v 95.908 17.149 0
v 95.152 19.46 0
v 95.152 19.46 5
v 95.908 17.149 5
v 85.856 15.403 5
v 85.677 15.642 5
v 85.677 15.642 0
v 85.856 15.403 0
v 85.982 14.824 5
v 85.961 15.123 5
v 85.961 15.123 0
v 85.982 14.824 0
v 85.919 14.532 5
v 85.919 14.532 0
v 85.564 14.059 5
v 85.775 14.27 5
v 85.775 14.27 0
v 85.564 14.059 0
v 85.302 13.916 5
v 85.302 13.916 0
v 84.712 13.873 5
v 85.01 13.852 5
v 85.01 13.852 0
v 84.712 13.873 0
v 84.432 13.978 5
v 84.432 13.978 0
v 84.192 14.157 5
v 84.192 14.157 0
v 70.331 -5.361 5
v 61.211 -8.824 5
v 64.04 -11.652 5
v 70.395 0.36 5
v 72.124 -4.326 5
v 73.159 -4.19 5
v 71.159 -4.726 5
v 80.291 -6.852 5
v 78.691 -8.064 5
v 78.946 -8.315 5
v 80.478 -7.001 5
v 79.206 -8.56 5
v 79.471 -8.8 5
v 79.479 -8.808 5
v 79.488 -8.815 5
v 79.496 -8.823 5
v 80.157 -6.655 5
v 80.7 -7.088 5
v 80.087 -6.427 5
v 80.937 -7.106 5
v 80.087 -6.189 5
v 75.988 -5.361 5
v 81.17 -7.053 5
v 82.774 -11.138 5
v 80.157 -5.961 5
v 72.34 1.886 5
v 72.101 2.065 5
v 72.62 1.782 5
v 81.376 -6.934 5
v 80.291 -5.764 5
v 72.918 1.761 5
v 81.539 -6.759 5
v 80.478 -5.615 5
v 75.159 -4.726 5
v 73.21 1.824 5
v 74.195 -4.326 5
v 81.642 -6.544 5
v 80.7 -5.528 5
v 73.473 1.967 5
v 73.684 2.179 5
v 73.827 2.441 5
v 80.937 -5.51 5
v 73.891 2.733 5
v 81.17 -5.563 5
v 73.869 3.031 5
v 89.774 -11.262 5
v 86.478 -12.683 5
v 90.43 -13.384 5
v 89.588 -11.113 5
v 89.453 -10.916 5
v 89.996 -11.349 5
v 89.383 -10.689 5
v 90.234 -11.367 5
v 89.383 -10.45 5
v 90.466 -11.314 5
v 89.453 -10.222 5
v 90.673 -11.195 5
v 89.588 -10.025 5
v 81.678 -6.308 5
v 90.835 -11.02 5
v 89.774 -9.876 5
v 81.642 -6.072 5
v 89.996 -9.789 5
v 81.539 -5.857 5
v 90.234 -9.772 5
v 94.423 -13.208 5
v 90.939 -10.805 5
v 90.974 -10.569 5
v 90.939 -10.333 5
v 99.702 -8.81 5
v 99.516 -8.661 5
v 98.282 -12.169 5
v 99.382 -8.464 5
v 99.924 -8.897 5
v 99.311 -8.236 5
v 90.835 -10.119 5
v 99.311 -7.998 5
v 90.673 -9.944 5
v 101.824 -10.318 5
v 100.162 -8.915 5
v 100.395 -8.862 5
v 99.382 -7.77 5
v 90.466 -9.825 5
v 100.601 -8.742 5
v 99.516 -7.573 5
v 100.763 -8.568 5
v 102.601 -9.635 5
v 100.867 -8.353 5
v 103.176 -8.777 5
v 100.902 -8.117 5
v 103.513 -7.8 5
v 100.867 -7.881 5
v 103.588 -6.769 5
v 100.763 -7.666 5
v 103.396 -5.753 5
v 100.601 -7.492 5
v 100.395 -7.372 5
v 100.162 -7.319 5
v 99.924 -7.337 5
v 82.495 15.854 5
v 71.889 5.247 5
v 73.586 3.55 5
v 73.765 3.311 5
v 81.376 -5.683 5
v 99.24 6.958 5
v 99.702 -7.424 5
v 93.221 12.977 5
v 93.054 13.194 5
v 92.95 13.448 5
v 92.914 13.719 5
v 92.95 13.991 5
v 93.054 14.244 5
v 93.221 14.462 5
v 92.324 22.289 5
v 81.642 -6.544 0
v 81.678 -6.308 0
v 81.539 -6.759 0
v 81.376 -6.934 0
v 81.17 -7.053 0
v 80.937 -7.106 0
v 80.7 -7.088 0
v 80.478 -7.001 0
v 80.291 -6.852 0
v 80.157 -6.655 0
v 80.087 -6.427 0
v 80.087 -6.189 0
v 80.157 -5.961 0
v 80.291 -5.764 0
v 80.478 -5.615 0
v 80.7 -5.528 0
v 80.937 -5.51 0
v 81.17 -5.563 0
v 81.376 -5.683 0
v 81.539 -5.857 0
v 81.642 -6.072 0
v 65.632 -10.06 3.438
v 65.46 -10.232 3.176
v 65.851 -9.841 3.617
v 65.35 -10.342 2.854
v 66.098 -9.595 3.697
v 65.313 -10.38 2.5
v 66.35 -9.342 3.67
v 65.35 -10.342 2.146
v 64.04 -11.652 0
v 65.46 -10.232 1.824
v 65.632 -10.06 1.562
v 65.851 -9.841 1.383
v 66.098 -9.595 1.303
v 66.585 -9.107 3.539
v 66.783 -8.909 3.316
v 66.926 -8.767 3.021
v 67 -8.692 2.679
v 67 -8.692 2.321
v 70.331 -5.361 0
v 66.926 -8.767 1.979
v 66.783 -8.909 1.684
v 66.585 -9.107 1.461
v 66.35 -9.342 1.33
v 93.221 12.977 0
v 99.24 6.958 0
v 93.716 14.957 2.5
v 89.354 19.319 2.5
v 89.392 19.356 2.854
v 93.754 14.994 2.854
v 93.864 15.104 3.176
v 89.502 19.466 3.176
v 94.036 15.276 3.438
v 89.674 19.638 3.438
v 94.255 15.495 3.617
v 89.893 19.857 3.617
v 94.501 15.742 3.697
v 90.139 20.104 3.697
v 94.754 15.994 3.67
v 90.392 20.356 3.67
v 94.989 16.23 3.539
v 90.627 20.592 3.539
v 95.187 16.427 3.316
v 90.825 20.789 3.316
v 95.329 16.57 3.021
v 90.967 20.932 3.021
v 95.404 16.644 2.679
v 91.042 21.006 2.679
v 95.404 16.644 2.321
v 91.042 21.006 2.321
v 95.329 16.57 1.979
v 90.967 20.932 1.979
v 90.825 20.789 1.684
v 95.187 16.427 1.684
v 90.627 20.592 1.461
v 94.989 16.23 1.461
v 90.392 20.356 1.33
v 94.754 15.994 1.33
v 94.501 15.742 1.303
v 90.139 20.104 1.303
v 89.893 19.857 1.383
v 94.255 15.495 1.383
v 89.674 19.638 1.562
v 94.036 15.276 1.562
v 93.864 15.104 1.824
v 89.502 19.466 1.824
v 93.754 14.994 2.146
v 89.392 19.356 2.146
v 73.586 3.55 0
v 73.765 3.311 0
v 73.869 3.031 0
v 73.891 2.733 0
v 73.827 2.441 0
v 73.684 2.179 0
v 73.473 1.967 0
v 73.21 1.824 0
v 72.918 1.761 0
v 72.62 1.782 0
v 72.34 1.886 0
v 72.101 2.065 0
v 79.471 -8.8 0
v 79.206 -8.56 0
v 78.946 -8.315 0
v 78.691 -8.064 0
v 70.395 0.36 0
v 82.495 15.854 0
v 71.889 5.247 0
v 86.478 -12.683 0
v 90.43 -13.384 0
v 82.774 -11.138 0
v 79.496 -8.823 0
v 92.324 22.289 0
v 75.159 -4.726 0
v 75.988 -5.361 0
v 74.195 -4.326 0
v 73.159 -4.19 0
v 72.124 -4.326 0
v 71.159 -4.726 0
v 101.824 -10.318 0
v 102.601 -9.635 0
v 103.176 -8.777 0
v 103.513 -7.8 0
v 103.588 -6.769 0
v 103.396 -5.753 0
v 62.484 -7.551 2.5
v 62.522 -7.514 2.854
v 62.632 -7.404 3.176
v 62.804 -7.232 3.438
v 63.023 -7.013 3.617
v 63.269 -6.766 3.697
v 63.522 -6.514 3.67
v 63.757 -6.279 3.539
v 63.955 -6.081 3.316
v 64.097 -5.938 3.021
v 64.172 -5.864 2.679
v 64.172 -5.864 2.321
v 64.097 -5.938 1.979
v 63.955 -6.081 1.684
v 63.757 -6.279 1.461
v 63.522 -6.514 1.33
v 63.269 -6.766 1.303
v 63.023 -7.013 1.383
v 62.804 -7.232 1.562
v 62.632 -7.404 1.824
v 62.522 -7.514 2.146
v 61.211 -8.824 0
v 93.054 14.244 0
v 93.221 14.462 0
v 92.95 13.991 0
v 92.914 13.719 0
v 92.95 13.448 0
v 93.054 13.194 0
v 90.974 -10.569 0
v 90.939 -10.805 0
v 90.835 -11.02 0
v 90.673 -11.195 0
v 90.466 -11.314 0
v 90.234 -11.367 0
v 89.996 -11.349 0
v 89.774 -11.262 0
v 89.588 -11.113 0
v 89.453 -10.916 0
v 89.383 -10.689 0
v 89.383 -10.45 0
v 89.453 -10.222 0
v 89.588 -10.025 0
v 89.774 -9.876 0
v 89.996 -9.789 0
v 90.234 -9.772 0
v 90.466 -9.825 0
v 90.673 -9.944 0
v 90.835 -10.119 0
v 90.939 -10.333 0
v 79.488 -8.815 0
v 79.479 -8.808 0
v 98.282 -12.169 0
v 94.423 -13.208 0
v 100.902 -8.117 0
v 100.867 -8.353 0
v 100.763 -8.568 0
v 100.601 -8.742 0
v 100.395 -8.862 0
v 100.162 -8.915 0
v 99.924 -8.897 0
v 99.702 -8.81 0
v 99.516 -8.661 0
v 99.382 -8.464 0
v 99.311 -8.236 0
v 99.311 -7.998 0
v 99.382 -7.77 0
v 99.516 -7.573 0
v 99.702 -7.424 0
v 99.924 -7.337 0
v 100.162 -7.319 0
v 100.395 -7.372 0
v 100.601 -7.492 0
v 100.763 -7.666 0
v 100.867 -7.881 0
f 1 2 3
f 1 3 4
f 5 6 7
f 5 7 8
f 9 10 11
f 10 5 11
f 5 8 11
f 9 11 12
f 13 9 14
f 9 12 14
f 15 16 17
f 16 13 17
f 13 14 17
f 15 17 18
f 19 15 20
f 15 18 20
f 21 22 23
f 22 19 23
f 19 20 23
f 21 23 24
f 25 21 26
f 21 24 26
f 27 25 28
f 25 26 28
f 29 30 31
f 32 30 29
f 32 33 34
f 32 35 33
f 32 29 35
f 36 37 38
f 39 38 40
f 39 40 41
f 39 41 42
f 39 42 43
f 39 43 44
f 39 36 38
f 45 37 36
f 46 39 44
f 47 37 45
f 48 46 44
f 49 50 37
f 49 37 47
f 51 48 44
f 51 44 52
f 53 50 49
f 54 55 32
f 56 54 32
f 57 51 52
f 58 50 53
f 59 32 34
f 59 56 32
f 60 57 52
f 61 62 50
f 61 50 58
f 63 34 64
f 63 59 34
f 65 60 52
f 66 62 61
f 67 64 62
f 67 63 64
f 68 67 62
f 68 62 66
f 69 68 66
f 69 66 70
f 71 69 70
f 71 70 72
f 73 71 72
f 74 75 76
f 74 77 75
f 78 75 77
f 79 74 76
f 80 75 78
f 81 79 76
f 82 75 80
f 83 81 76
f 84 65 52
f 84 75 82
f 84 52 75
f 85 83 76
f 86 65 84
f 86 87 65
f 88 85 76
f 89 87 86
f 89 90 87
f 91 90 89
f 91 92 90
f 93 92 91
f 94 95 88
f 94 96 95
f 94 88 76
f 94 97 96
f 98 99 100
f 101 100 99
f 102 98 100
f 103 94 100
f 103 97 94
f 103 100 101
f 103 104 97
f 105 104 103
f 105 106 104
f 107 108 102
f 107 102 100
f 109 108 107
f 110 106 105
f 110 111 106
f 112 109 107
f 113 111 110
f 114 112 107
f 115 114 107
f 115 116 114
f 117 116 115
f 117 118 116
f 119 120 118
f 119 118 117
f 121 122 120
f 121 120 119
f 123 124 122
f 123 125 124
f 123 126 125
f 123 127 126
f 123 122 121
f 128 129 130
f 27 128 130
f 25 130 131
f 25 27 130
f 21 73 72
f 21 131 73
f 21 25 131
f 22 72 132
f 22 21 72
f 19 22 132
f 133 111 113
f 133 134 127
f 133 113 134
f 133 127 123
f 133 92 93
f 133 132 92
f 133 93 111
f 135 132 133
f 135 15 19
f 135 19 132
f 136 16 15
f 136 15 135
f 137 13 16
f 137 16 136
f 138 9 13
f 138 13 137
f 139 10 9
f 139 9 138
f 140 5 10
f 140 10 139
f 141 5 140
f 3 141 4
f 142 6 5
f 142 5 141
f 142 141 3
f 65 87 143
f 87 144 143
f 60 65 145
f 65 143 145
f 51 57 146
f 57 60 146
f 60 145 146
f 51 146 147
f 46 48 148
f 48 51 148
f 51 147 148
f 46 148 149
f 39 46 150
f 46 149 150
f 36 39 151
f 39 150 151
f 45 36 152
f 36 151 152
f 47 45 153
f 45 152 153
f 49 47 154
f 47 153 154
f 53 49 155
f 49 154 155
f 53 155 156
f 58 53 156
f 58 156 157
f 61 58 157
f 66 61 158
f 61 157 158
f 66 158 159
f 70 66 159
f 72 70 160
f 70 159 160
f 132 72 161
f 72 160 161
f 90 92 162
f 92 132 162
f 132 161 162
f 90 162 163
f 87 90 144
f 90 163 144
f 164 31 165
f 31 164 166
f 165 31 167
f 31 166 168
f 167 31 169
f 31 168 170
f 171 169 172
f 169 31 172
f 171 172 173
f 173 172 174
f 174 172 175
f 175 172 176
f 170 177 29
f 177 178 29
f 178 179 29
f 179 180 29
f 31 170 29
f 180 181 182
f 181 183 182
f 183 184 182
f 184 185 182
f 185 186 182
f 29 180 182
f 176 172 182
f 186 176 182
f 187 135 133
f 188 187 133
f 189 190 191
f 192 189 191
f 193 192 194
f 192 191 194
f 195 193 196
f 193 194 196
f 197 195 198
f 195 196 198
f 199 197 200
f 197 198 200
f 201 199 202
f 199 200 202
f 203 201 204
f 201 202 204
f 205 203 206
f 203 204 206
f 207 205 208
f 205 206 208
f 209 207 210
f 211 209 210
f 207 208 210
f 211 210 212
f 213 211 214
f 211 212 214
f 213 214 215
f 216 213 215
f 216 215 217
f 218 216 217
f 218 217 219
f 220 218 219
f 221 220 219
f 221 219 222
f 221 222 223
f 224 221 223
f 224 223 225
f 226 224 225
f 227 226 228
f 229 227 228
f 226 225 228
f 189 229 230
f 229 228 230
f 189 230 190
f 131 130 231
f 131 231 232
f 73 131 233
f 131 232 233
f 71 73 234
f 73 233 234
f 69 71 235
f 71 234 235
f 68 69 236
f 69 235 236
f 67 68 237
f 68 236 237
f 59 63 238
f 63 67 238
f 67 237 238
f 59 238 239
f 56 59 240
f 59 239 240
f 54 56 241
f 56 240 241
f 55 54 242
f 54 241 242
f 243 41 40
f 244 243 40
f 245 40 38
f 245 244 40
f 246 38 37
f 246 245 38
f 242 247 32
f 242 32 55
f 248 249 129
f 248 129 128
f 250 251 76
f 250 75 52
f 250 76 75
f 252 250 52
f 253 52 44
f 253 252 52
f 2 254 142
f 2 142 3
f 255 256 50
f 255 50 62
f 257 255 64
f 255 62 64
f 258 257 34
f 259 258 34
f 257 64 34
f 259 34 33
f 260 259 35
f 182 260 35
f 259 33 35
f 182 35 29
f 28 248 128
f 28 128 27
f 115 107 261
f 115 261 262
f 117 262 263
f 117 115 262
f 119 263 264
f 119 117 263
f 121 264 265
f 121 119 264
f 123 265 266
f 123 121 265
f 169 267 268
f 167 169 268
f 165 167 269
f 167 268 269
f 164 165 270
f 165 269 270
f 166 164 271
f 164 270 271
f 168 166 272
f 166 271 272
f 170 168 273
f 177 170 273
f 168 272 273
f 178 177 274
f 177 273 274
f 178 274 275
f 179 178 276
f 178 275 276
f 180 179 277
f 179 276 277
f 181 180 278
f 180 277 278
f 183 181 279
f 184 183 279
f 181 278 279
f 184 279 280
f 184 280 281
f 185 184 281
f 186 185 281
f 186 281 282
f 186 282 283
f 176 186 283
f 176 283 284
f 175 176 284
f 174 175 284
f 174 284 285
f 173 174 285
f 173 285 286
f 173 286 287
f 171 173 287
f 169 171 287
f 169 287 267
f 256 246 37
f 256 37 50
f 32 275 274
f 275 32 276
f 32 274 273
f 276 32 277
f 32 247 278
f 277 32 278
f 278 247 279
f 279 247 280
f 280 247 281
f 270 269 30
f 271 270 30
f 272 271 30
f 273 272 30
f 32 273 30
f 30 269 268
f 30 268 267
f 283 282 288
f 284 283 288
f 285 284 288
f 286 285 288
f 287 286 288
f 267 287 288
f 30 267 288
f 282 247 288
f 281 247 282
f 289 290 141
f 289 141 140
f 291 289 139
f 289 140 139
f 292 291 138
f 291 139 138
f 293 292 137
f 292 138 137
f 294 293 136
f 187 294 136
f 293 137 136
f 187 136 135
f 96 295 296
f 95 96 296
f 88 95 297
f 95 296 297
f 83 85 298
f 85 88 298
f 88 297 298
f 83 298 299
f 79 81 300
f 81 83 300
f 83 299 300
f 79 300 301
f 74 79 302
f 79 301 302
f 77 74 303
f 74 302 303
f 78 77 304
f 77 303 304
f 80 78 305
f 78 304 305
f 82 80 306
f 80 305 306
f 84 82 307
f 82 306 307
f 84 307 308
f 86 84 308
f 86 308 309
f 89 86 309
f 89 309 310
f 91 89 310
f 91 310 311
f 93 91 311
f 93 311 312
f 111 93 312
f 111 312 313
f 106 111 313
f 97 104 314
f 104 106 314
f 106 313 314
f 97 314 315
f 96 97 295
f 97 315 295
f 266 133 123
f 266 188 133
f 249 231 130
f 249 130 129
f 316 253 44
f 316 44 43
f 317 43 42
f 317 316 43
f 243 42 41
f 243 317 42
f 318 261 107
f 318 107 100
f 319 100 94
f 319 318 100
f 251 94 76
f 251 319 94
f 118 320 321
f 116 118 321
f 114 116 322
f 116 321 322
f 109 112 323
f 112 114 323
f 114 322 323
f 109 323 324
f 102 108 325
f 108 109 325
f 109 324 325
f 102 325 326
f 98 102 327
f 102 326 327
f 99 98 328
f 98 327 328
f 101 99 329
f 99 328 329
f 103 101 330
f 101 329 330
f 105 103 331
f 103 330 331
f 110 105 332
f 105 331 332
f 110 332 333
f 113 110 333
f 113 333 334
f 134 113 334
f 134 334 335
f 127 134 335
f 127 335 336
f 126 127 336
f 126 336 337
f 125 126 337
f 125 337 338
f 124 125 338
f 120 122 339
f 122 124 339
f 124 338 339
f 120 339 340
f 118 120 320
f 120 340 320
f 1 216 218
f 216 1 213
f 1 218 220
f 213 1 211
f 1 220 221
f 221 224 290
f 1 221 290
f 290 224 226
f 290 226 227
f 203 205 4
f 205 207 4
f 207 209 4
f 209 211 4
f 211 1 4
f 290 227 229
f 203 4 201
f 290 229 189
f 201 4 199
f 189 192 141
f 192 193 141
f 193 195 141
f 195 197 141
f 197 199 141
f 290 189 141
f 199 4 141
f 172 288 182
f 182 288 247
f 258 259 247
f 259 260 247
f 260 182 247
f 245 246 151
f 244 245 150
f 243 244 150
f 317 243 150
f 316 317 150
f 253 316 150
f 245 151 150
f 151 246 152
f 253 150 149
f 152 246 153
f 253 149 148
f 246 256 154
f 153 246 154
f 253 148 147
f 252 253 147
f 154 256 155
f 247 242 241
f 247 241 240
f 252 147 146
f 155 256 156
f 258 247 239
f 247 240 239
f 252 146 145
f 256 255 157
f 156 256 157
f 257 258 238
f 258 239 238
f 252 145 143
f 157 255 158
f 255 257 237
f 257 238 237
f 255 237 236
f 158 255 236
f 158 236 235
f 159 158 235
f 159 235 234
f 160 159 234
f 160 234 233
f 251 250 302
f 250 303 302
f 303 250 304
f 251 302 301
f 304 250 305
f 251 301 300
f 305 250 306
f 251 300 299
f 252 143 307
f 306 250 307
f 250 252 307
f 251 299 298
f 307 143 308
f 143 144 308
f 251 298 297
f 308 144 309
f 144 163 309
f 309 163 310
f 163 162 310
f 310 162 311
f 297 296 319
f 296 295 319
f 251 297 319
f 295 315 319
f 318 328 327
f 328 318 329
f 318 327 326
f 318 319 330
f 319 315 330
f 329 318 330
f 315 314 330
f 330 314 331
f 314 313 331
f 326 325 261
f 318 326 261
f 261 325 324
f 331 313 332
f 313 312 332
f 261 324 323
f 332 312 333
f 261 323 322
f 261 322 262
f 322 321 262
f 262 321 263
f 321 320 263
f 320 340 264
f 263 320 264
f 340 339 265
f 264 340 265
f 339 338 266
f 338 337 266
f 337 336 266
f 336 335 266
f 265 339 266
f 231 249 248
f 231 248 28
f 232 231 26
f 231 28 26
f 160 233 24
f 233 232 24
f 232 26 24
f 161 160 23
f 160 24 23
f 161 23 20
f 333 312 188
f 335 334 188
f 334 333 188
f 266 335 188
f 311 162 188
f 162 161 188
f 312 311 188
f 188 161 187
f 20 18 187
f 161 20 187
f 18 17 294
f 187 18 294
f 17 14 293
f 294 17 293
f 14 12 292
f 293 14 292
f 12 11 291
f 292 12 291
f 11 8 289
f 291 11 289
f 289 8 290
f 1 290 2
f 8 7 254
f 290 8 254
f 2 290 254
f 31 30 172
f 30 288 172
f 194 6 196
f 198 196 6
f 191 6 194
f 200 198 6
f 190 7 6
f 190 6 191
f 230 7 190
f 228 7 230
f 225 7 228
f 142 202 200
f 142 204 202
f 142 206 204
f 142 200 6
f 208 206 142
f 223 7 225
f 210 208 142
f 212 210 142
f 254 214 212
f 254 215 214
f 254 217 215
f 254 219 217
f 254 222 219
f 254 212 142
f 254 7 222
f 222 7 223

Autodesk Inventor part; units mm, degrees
ref_plane "YZ Plane" through (0, 0, 0) normal (1, 0, 0) x (0, 1, 0)
ref_plane "XZ Plane" through (0, 0, 0) normal (0, 1, 0) x (-1, 0, 0)
ref_plane "XY Plane" through (0, 0, 0) normal (0, 0, 1) x (1, 0, 0)
sketch "スケッチ2" plane through (0, 0, 0) normal (0, 0, 1) x (1, 0, 0)
  line L0 (0, 0) -> (7, 0) construction
  line L1 (7, 0) -> (7, -27) construction
  line L2 (7, -27) -> (0, -27) construction
  line L3 (0, -27) -> (0, 0) construction
  circle A0 centre (2.5, -3.7) radius 1.6 construction
  circle A1 centre (2.5, -23.3) radius 1.6 construction
  line L4 (5.05, -7.5) -> (0.05, -7.5) construction
  line L5 (0.05, -7.5) -> (0.05, -19.5) construction
  line L6 (0.05, -19.5) -> (5.05, -19.5) construction
  line L7 (5.05, -19.5) -> (5.05, -7.5) construction
  line L8 (0, -7.45) -> (5.1, -7.45) construction
  line L9 (5.1, -7.45) -> (5.1, -19.55) construction
  line L10 (5.1, -19.55) -> (0, -19.55) construction
  line L11 (0, -19.55) -> (0, -7.45) construction
  line L12 (88.7886, 25.8241) -> (57.6759, -5.2886) construction
  line L13 (57.6759, -5.2886) -> (61.2114, -8.8241) construction
  line L14 (61.2114, -8.8241) -> (84.1924, 14.1569) construction
  line L15 (92.3241, 22.2886) -> (88.7886, 25.8241) construction
  line L16 (70.3953, 0.3598) -> (72.1009, 2.0653)
  circle A2 centre (100.1023, -8.117) radius 0.8
  line L17 (7, 0) -> (45.561, -10.3324) construction
  line L18 (7, -27) -> (50.4418, -38.6402) construction
  line L19 (72.4418, -38.6402) -> (106.1477, -10.3575) construction
  line L20 (106.1477, -10.3575) -> (100.2529, -4.1751) construction
  arc A3 (45.561, -10.3324) -> (81.4937, -2.447) centre (55.9138, 28.3046) ccw construction
  line L21 (72.4418, -38.6402) -> (50.4418, -38.6402) construction
  line L22 (39, -8.8) -> (34, -8.8) construction
  line L23 (34, -8.8) -> (34, -33.8) construction
  line L24 (34, -33.8) -> (39, -33.8) construction
  line L25 (39, -33.8) -> (39, -8.8) construction
  circle A4 centre (97.0056, -9.675) radius 0.8 construction
  circle A5 centre (93.6401, -10.5063) radius 0.8 construction
  circle A6 centre (90.1742, -10.5693) radius 0.8
  circle A7 centre (86.7807, -9.8609) radius 0.8 construction
  circle A8 centre (83.6295, -8.4164) radius 0.8 construction
  circle A9 centre (80.8777, -6.3081) radius 0.8
  line L26 (100.2529, -4.1751) -> (104.2516, -8.3688)
  arc A10 (81.4937, -2.447) -> (100.2529, -4.1751) centre (91.6271, 4.8718) ccw construction
  line L27 (39, -15.3) -> (34, -15.3) construction
  line L28 (34, -15.3) -> (34, -27.3) construction
  line L29 (34, -27.3) -> (39, -27.3) construction
  line L30 (39, -27.3) -> (39, -15.3) construction
  line L31 (33.95, -15.25) -> (39.05, -15.25) construction
  line L32 (39.05, -15.25) -> (39.05, -27.35) construction
  line L33 (39.05, -27.35) -> (33.95, -27.35) construction
  line L34 (33.95, -27.35) -> (33.95, -15.25) construction
  circle A11 centre (36.5, -11.5) radius 1.6 construction
  circle A12 centre (36.5, -31.1) radius 1.6 construction
  line L35 (66, -30.5) -> (71, -30.5) construction
  circle A13 centre (68.5, -34.3) radius 1.6 construction
  line L36 (66, -37) -> (71, -37) construction
  line L37 (66, -18.5) -> (66, -30.5) construction
  line L38 (65.95, -30.55) -> (65.95, -18.45) construction
  line L39 (71, -30.5) -> (71, -18.5) construction
  line L40 (66, -12) -> (66, -37) construction
  line L41 (71, -37) -> (71, -12) construction
  line L42 (71.05, -18.45) -> (71.05, -30.55) construction
  line L43 (71.05, -30.55) -> (65.95, -30.55) construction
  circle A14 centre (68.5, -14.7) radius 1.6 construction
  line L44 (71, -18.5) -> (66, -18.5) construction
  line L45 (65.95, -18.45) -> (71.05, -18.45) construction
  line L46 (71, -12) -> (66, -12) construction
  circle A15 centre (71.05, -19.5) radius 1.05 construction
  circle A16 centre (65.95, -19.5) radius 1.05 construction
  circle A17 centre (65.95, -29.5) radius 1.05 construction
  circle A18 centre (71.05, -29.5) radius 1.05 construction
  circle A19 centre (39.05, -16.3) radius 1.05 construction
  circle A20 centre (33.95, -16.3) radius 1.05 construction
  circle A21 centre (33.95, -26.3) radius 1.05 construction
  circle A22 centre (39.05, -26.3) radius 1.05 construction
  circle A23 centre (5.1, -8.5) radius 1.05 construction
  circle A24 centre (0, -8.5) radius 1.05 construction
  circle A25 centre (0, -18.5) radius 1.05 construction
  circle A26 centre (5.1, -18.5) radius 1.05 construction
  line L47 (-3, -7.45) -> (-3, -19.55) construction
  line L48 (-3, -19.55) -> (0, -27) construction
  line L49 (-3, -7.45) -> (0, 0) construction
  circle A27 centre (91.6271, 4.8718) radius 15.5 construction
  arc A28 (77.4664, -6.7113) -> (78.1043, -7.45) centre (91.6271, 4.8718) ccw construction
  line L50 (77.4664, -6.7113) -> (80.2948, -9.5397) construction
  line L51 (104.2516, -8.3688) -> (82.9591, 12.9236) construction
  line L52 (82.9591, 12.9236) -> (84.1924, 14.1569) construction
  line L53 (70.3953, 0.3598) -> (61.2114, -8.8241)
  line L54 (92.3241, 22.2886) -> (95.1525, 19.4602)
  line L55 (95.1525, 19.4602) -> (104.2516, -8.3688)
  line L56 (61.2114, -8.8241) -> (64.0398, -11.6525)
  arc A29 (90.4296, -13.3836) -> (104.2516, -8.3688) centre (91.6271, 4.8718) ccw
  line L57 (64.0398, -11.6525) -> (73.1594, -2.533)
  arc A30 (79.4965, -8.8227) -> (90.4296, -13.3836) centre (91.6271, 4.8718) ccw
  arc A31 (78.1501, -7.5) -> (78.6909, -8.0644) centre (91.6271, 4.8718) ccw construction
  arc A32 (79.4709, -8.8) -> (79.4965, -8.8227) centre (91.6271, 4.8718) ccw
  arc A33 (78.1043, -7.45) -> (78.1501, -7.5) centre (91.6271, 4.8718) ccw construction
  line L58 (84.1924, 14.1569) -> (73.5858, 3.5503) construction
  line L59 (73.5858, 3.5503) -> (71.8887, 5.2473)
  line L60 (71.8887, 5.2473) -> (82.4953, 15.8539)
  line L61 (82.4953, 15.8539) -> (84.1924, 14.1569)
  line L62 (73.5858, 3.5503) -> (82.9591, 12.9236) construction
  line L63 (84.1924, 14.1569) -> (85.6773, 15.6418) construction
  line L64 (84.1924, 14.1569) -> (85.6773, 15.6418) construction
  arc A34 (84.1924, 14.1569) -> (85.6773, 15.6418) centre (84.9349, 14.8993) ccw
  arc A35 (72.1009, 2.0653) -> (73.5858, 3.5503) centre (72.8433, 2.8078) ccw
  arc A36 (85.6773, 15.6418) -> (84.1924, 14.1569) centre (84.9349, 14.8993) ccw construction
  line L65 (85.6773, 15.6418) -> (92.3241, 22.2886) construction
  line L66 (72.1009, 2.0653) -> (73.5858, 3.5503) construction
  arc A37 (73.5858, 3.5503) -> (72.1009, 2.0653) centre (72.8433, 2.8078) ccw construction
  line L67 (85.6773, 15.6418) -> (92.3241, 22.2886)
  line L68 (78.6909, -8.0644) -> (73.1594, -2.533)
  arc A38 (78.6909, -8.0644) -> (79.4709, -8.8) centre (91.6271, 4.8718) ccw
  point P0 (75, 8.5)
  point P1 (91.5446, -20.9171)
  point P2 (82.042, -3.1517)
  point P3 (81.2596, -2.6403)
  point P4 (55.561, -0.3324)
  point P5 (39, -14.2)
  point P6 (34, -14.2)
  point P7 (39, -28.4)
  point P8 (34, -28.4)
  point P9 (79.9568, -9.217)
  dimension "d74" = 7
  dimension "d75" = 27
  dimension "d76" = 3.2
  dimension "d77" = 3.2
  dimension "d78" = 5
  dimension "d79" = 12
  dimension "d80" = 2.5
  dimension "d81" = 2.5
  dimension "d82" = 19.6
  dimension "d83" = 3.7
  dimension "d84" = 7.5
  dimension "d85" = 0.05
  dimension "d86" = 44
  dimension "d87" = 5
  dimension "d88" = 45
  dimension "d89" = 2.5
  dimension "d90" = 22
  dimension "d91" = 75
  dimension "d92" = 8.5
  dimension "d93" = 30
  dimension "d94" = 27
  dimension "d95" = 1.6
  dimension "d96" = 75
  dimension "d97" = 75
  dimension "d98" = 40
  dimension "d99" = 30
  dimension "d100" = 39
  dimension "d101" = 5
  dimension "d102" = 25
  dimension "d103" = 32
  dimension "d104" = 8.8
  dimension "d105" = 77
  dimension "d106" = 22
  dimension "d107" = 12.5
  dimension "d108" = 50
  dimension "d109" = 21
  dimension "d110" = 44
  dimension "d111" = 12
  dimension "d112" = 6.5
  dimension "d113" = 0.05
  dimension "d114" = 3.2
  dimension "d115" = 2.5
  dimension "d116" = 2.7
  dimension "d117" = 3.2
  dimension "d118" = 19.6
  dimension "d119" = 2.5
  dimension "d120" = 5
  dimension "d121" = 25
  dimension "d122" = 12
  dimension "d123" = 6.5
  dimension "d124" = 0.05
  dimension "d125" = 3.2
  dimension "d126" = 2.5
  dimension "d127" = 2.7
  dimension "d128" = 3.2
  dimension "d129" = 19.6
  dimension "d130" = 2.5
  dimension "d131" = 12
  dimension "d132" = 64
  dimension "d133" = 2.1
  dimension "d134" = 2.1
  dimension "d135" = 2.1
  dimension "d136" = 2.1
  dimension "d137" = 2.1
extrude "押し出し2" add sketch "スケッチ2" along normal blind 5
sketch "スケッチ3" plane through (85.6773, 15.6418, 0) normal (-0.7071068, 0.7071068, 0) x (-0.7071068, -0.7071068, 0)
  circle A0 centre (-6.4, 2.5) radius 1.2
  circle A1 centre (31.6, 2.5) radius 1.2
  line L0 (-9.4, 0) -> (0, 0) projected
  line L1 (-9.4, 0) -> (-9.4, 5) projected
  line L2 (34.6, 0) -> (34.6, 5) projected
  line L3 (19.2, 0) -> (34.6, 0) projected
  point P0 (71.6434, 0)
  dimension "d165" = 2.4
  dimension "d166" = 2.4
  dimension "d167" = 2.5
  dimension "d168" = 3
  dimension "d169" = 3
  dimension "d170" = 2.5
extrude "押し出し3" cut sketch "スケッチ3" against normal through all
fillet "フィレット1" radius 4 2 edges at (104.2516, -8.3688, 2.5) (73.1594, -2.533, 2.5)
sketch "スケッチ5" plane through (0, 0, 5) normal (0, 0, 1) x (1, 0, 0)
  line L0 (89.3543, 19.3187) -> (91.0513, 21.0158) construction
  line L1 (103.3964, -5.7534) -> (95.1525, 19.4602) construction
  line L2 (95.9083, 17.1488) -> (92.4788, 13.7193)
  line L3 (92.4788, 13.7193) -> (99.2403, 6.9578)
  line L4 (90.2028, 20.1673) -> (100.0709, 10.2991) construction
  line L5 (92.3241, 22.2886) -> (85.6773, 15.6418) construction
  line L6 (93.2213, 14.4618) -> (93.9637, 13.7193) construction
  line L7 (93.9637, 13.7193) -> (93.2213, 12.9769) construction
  arc A0 (93.2213, 14.4618) -> (93.2213, 12.9769) centre (93.9637, 13.7193) ccw
  line L8 (93.2213, 14.4618) -> (98.519, 9.1641) construction
  line L9 (95.9083, 17.1488) -> (101.13, 11.927) construction
  line L10 (99.2403, 6.9578) -> (95.9083, 17.1488)
  point P0 (0, 0)
  point P1 (95.9083, 17.1488)
  dimension "d179" = 1.05
  dimension "d180" = 1.9
extrude "押し出し4" cut sketch "スケッチ5" against normal up to surface (5 mm away) contours L10 L3 A0 L2
properties part number "カメラ_メインフレーム" material "アセタール樹脂、黒"
